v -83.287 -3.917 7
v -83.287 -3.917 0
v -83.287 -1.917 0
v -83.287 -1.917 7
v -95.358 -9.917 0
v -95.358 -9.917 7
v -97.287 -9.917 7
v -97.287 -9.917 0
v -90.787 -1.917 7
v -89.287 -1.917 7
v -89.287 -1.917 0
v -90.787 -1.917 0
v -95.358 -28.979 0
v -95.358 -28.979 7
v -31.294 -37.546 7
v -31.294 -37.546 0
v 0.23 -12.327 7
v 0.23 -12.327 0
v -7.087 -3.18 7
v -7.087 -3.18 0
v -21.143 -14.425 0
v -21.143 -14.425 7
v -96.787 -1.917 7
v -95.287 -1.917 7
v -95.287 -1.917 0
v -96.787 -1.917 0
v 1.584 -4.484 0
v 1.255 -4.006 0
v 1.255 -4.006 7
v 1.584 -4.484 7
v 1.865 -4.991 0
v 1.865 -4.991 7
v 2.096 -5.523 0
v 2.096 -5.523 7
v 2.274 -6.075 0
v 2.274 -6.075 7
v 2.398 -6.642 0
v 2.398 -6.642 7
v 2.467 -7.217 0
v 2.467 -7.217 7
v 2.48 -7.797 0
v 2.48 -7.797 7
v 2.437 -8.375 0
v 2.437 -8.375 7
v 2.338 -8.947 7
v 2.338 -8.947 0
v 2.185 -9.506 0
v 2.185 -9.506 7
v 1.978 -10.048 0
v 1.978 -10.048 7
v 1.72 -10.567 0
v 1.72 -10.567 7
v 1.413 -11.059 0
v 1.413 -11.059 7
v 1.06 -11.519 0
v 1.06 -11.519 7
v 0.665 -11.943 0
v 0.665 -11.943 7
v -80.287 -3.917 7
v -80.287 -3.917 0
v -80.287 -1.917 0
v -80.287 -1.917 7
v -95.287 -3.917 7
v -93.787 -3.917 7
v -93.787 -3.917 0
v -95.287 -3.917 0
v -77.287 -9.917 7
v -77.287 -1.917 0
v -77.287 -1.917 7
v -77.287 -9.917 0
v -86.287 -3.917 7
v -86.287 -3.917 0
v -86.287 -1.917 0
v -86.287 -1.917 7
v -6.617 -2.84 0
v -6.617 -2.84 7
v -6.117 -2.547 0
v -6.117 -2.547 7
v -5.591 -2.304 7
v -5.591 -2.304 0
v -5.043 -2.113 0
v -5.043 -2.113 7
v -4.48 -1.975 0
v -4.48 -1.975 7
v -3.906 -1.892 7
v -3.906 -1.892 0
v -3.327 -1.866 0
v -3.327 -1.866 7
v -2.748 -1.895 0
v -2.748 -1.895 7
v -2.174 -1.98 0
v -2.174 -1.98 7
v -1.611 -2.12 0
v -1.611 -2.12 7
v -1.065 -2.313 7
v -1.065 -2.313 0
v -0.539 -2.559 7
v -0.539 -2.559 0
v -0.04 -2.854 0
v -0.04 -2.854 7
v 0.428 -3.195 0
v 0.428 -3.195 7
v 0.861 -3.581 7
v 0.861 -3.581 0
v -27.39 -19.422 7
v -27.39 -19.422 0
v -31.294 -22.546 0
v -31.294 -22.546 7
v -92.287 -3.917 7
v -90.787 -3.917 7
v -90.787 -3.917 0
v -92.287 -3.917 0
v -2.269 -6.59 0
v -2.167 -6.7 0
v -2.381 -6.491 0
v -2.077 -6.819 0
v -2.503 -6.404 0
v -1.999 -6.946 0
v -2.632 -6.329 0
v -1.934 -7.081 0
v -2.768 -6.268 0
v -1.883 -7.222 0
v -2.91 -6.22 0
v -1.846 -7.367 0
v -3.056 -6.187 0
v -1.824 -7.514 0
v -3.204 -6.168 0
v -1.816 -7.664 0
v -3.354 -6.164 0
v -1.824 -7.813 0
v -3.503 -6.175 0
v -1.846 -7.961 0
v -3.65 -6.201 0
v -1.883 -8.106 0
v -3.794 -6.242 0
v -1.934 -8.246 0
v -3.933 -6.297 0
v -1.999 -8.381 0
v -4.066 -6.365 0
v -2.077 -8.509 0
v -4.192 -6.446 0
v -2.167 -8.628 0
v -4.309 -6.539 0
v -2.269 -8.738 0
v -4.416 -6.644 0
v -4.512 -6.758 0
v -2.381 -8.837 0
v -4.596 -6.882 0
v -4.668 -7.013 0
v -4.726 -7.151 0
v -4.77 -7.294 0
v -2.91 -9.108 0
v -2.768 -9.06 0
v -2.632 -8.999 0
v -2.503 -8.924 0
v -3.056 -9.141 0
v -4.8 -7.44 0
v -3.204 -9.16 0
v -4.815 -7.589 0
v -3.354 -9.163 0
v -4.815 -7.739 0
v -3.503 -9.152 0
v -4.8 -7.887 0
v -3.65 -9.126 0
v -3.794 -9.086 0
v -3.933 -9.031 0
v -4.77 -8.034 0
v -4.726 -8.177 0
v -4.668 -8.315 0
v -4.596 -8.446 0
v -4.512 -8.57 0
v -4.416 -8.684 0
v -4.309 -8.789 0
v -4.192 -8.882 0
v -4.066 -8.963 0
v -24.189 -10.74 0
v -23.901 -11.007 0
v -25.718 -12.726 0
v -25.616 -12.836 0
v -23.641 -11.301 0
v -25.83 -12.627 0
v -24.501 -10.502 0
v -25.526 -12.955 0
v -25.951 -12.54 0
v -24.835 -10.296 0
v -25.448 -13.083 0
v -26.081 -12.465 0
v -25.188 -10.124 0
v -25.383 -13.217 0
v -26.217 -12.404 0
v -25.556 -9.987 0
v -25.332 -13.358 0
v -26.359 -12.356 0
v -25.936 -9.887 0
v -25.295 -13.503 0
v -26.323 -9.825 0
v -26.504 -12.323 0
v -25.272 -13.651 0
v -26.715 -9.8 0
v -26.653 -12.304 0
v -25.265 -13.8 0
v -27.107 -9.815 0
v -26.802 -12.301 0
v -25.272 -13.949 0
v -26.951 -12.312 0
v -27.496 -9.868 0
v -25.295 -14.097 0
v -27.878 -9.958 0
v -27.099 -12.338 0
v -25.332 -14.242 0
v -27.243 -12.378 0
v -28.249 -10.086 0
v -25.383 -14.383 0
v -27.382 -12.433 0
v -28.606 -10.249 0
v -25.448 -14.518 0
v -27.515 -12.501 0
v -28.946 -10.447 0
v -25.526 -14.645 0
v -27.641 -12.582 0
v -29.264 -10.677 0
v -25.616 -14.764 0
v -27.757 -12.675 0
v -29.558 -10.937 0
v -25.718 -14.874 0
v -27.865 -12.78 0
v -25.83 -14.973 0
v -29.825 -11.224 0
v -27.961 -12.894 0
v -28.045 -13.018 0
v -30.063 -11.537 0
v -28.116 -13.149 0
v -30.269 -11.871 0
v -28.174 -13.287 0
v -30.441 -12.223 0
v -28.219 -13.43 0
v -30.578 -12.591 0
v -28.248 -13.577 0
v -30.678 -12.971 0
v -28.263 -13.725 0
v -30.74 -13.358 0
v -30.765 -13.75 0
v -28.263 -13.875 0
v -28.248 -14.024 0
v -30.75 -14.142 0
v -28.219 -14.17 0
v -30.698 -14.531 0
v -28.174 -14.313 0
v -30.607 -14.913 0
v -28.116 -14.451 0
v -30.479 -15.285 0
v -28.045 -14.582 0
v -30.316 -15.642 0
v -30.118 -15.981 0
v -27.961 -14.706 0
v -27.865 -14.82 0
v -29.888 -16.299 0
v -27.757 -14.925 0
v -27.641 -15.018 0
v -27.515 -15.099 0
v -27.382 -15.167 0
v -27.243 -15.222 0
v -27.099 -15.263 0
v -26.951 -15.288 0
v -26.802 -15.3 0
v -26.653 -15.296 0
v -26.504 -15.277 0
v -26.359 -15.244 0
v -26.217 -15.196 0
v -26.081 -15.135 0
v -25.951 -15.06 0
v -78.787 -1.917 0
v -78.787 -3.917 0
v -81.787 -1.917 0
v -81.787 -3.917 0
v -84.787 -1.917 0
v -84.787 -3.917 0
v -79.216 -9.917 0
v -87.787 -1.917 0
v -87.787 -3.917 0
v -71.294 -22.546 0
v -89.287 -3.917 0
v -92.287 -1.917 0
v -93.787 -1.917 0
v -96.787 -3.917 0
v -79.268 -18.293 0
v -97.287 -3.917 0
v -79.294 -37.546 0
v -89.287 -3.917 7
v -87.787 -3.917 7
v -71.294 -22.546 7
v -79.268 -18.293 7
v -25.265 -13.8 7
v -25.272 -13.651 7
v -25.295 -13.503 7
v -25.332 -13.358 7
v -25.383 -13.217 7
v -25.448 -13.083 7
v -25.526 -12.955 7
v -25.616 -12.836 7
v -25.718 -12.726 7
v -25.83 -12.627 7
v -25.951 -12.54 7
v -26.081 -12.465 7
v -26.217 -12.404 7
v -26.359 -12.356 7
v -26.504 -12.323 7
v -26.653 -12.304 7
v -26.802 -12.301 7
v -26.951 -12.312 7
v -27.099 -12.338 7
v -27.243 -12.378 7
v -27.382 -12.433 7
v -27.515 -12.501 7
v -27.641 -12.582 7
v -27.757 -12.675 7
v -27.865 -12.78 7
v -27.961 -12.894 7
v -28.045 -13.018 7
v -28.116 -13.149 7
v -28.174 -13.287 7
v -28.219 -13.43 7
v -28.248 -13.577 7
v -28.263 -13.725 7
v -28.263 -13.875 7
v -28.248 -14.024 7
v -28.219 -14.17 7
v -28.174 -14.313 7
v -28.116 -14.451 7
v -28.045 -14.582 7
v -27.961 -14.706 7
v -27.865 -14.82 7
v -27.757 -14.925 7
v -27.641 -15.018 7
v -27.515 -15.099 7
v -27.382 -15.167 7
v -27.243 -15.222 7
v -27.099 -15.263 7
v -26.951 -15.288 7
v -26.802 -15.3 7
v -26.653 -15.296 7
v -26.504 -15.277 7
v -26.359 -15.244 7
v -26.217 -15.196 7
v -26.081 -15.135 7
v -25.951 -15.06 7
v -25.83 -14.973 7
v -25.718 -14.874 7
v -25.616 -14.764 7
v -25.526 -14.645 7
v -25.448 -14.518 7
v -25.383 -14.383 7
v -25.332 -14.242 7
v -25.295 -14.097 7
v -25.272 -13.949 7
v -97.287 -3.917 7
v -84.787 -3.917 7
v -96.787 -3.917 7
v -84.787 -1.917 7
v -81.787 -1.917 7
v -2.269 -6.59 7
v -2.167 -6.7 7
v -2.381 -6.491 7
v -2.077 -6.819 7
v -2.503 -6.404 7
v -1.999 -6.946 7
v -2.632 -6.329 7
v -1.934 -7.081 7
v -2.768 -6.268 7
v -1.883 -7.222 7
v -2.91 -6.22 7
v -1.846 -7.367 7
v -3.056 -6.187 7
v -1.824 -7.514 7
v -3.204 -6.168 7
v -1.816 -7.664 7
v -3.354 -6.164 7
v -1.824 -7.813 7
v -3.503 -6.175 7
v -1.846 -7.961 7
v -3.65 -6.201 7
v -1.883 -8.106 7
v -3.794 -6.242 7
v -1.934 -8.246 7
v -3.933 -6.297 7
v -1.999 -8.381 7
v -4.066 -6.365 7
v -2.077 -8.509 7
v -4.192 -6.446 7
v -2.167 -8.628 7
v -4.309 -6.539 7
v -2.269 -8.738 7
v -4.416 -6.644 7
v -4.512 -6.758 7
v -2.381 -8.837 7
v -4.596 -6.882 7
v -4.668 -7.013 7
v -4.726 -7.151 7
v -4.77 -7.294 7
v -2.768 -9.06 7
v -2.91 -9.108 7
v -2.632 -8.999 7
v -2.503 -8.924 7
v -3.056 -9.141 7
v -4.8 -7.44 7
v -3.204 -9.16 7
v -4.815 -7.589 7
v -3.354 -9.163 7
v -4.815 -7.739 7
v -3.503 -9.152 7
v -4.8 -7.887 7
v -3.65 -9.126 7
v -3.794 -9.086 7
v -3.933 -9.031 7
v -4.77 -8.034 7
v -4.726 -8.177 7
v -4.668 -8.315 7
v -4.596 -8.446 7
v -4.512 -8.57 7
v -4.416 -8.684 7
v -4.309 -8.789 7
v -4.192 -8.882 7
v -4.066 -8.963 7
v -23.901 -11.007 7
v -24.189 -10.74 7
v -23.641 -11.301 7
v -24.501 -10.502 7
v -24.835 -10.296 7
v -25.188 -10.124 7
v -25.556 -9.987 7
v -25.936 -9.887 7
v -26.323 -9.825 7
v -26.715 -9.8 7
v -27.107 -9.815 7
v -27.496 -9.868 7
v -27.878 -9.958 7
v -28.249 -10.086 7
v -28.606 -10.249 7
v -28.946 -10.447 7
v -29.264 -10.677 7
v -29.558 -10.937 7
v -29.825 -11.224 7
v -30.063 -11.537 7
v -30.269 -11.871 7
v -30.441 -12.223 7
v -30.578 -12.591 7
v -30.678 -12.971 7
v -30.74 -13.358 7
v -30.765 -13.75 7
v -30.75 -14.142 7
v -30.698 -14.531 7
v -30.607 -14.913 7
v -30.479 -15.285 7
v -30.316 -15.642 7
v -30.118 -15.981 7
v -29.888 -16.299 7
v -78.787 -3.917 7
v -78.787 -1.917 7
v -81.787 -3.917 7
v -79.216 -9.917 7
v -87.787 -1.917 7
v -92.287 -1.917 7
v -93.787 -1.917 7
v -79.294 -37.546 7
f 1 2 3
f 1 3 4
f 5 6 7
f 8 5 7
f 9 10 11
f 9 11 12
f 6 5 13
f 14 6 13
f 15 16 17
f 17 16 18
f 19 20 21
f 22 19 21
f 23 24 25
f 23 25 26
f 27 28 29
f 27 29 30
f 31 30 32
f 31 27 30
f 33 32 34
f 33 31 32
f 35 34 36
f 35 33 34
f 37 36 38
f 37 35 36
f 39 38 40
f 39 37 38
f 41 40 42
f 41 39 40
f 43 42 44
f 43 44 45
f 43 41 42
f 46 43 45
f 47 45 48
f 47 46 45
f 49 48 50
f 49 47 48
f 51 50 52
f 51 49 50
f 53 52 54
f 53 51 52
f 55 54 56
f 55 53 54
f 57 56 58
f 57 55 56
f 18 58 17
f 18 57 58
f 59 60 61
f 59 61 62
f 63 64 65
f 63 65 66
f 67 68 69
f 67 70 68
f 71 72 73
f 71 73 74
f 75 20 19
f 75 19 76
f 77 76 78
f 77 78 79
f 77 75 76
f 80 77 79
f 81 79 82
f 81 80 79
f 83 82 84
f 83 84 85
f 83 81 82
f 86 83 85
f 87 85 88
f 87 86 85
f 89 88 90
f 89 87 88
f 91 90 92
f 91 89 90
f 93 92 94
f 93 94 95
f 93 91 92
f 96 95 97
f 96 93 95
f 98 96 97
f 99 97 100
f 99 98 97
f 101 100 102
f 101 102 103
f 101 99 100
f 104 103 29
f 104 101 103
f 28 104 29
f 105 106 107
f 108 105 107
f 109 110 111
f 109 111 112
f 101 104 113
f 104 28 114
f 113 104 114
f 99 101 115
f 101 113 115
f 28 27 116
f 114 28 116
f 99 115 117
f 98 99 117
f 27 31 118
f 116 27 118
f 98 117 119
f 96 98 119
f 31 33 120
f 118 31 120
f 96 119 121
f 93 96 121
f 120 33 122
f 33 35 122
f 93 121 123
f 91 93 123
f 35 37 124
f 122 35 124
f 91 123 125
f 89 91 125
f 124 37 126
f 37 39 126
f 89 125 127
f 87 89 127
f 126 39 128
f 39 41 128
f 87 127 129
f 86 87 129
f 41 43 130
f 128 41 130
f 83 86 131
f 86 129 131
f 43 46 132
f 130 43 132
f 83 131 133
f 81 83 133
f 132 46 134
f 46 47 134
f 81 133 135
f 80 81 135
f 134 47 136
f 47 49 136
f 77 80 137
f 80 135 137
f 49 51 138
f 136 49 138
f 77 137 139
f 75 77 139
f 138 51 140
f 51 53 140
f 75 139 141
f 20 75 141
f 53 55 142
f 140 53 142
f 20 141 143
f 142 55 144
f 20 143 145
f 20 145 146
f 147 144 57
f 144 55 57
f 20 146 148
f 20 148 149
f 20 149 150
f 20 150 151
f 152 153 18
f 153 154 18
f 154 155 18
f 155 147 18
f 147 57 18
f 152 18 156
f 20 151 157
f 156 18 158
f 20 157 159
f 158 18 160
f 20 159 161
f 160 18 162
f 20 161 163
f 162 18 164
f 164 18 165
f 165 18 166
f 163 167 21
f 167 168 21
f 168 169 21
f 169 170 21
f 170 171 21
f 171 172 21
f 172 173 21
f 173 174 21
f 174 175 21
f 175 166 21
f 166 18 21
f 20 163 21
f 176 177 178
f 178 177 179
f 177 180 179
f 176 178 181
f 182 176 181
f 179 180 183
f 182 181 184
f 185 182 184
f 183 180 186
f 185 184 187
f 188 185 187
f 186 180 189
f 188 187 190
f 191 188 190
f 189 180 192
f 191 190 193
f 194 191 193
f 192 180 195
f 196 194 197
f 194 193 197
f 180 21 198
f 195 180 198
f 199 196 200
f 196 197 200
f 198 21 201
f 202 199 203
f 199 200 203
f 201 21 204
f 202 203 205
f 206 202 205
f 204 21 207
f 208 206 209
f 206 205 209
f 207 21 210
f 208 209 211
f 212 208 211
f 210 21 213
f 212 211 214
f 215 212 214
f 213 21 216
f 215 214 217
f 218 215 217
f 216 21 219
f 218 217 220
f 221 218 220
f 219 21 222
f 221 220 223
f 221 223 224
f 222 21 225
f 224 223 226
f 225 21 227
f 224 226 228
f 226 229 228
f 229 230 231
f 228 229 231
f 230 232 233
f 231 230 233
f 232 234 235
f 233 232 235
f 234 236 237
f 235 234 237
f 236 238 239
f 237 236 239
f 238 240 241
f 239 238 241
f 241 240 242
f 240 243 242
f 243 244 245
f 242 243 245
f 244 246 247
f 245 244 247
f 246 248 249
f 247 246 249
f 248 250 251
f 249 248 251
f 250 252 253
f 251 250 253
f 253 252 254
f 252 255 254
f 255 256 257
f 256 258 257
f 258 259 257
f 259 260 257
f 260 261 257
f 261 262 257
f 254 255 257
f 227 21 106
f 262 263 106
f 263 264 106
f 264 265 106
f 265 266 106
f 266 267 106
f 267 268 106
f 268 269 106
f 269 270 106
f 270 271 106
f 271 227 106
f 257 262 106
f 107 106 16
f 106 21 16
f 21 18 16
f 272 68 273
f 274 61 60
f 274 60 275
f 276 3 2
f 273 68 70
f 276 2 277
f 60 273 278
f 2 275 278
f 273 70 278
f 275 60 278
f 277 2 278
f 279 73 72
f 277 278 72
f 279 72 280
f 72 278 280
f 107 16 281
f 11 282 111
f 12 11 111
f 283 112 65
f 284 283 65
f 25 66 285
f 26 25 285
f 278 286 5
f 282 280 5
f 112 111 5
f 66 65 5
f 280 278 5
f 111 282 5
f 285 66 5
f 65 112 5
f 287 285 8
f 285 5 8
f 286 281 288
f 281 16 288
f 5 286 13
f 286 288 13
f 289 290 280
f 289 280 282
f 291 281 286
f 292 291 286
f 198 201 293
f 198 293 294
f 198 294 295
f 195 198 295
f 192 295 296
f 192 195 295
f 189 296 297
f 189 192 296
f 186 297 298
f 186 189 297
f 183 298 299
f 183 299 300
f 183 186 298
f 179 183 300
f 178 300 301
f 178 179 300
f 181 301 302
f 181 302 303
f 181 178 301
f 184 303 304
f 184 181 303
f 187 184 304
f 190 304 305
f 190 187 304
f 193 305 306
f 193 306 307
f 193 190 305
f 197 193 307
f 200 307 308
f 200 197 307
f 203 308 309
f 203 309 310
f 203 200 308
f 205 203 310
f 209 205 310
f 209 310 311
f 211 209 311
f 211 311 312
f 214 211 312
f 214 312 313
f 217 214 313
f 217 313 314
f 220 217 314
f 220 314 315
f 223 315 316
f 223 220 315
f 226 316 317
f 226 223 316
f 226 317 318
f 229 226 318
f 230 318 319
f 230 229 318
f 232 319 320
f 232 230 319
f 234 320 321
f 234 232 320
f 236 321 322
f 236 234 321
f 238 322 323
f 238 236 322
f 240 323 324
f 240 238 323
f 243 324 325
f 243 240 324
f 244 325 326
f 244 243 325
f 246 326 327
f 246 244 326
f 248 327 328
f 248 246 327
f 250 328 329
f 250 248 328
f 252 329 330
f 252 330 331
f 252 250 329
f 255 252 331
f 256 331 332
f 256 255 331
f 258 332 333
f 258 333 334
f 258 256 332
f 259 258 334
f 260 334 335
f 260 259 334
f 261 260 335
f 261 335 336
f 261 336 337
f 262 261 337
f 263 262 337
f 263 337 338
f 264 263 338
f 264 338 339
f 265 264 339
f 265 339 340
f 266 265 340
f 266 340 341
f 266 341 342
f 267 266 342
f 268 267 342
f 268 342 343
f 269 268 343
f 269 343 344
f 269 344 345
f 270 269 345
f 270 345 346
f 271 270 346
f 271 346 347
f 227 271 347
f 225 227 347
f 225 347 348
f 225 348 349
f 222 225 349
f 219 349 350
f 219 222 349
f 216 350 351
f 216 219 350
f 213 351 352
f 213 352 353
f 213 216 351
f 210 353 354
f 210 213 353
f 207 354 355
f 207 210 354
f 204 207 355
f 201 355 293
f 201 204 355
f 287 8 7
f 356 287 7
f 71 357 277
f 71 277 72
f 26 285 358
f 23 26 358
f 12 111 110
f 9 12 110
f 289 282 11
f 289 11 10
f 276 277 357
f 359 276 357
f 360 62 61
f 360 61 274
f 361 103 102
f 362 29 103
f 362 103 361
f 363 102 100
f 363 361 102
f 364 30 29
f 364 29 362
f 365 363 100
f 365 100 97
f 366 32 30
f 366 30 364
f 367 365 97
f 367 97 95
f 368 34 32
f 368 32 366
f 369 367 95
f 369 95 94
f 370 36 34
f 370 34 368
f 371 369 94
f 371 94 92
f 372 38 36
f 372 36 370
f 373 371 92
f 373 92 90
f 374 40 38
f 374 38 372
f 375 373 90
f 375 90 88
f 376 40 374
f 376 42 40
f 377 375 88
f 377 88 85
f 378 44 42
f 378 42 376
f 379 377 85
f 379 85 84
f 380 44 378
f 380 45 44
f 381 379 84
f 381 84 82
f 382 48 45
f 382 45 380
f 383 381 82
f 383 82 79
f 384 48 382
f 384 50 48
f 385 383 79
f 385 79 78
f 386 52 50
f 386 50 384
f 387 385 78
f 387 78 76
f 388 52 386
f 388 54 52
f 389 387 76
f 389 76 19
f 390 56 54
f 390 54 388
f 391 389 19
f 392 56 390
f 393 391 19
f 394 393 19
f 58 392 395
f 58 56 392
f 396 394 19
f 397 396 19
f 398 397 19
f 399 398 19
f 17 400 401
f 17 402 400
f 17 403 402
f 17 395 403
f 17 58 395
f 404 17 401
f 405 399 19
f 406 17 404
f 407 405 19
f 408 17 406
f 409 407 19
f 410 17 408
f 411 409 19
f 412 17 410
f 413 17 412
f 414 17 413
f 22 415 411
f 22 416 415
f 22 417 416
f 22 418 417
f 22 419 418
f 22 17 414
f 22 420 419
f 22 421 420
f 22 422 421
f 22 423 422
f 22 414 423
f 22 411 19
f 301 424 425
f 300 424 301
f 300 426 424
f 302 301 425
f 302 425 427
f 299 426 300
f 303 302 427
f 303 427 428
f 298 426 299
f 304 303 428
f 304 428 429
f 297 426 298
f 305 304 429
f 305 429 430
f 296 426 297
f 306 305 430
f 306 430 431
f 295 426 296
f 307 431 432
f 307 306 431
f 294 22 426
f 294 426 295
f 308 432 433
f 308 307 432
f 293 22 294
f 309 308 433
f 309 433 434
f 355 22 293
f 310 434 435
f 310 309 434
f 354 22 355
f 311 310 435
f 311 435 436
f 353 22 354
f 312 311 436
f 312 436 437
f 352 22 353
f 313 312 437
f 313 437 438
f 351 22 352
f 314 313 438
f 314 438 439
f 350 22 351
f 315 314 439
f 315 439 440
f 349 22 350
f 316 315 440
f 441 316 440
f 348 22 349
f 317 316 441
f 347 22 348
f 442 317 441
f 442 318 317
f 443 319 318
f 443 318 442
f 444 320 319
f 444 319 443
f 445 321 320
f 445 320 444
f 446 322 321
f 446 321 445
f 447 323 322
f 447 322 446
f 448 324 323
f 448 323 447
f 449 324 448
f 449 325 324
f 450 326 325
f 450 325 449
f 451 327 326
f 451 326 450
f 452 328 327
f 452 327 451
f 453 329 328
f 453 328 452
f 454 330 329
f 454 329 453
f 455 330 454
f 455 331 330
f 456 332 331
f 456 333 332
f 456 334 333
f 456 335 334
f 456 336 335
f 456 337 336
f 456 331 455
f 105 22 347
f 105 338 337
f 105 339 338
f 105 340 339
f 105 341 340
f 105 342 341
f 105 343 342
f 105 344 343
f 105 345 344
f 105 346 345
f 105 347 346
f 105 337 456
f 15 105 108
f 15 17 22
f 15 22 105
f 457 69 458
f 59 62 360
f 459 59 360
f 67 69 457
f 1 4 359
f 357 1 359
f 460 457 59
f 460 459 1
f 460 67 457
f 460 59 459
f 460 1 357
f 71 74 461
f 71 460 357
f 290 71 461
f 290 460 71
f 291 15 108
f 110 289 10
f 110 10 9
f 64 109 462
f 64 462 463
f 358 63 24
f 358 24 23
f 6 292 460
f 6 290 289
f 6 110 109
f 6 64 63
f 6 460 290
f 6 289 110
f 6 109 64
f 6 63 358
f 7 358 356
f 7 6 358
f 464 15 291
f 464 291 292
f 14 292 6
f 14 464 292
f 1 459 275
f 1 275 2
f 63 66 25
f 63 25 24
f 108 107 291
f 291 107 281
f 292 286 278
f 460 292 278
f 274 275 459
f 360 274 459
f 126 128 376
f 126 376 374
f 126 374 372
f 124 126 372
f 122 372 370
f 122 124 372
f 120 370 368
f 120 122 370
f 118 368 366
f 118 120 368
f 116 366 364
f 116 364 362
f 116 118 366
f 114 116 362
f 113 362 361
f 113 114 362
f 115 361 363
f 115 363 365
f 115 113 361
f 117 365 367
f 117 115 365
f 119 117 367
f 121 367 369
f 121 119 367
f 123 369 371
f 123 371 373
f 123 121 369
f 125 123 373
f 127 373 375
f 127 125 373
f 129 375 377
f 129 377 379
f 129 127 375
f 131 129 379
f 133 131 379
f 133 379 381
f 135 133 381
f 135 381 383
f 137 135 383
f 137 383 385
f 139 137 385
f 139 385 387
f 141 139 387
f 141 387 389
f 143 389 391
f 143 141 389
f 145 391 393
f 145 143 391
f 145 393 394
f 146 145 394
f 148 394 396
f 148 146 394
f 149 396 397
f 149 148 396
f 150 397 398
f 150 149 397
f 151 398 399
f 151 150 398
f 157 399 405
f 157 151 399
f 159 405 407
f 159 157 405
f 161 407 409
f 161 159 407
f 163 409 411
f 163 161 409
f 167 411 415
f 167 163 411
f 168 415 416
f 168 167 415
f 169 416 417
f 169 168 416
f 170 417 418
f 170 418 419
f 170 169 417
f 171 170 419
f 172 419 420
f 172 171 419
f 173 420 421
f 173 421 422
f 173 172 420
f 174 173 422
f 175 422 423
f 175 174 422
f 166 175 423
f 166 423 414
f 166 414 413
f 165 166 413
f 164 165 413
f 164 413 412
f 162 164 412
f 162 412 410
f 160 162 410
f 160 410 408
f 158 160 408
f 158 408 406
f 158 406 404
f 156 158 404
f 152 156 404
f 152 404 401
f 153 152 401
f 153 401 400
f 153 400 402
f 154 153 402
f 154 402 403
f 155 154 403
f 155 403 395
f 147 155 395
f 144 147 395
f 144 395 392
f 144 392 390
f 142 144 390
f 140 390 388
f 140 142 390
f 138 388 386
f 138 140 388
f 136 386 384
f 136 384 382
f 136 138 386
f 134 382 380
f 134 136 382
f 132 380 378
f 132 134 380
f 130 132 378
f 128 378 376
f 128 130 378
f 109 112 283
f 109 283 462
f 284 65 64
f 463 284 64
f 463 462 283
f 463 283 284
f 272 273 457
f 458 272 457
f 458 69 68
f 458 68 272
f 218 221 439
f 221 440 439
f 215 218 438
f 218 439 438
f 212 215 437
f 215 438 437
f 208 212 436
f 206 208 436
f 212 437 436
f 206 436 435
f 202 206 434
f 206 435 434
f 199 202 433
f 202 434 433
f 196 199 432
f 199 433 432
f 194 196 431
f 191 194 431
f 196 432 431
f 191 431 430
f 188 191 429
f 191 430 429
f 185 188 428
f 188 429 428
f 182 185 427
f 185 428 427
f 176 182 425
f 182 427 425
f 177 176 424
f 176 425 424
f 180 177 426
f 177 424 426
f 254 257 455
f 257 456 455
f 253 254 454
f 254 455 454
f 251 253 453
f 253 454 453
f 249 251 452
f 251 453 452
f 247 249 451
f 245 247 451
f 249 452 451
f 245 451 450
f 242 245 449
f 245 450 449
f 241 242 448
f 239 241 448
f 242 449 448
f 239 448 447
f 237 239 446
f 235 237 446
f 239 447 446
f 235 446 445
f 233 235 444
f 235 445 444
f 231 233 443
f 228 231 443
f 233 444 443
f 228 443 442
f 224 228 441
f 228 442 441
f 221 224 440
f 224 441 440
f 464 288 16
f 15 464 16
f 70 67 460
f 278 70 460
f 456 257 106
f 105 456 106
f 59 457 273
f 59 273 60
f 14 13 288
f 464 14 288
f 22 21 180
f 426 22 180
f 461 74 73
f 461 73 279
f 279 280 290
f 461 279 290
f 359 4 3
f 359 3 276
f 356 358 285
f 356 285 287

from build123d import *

# Parameters (mm, degrees)
F0_R        = 1.5
F1_DEPTH    = 7
F2_R        = 3.99999
F3_T1_DEPTH = 37
F4_W        = 20
F4_H        = 7
F5_DEPTH    = 6
F6_W        = 1.5
F6_H        = 7
F7_DEPTH    = 2


# Not quite as in the source:
# - a fillet or chamfer that OpenCascade refuses, or shapes differently, is made with other operations: its cross-section is extruded or revolved along the edge and cut away or added
# - a fillet or chamfer is up to 0.001 mm smaller than in the source, because OpenCascade refuses the exact size


with BuildPart() as f1:
    # F0 (on Top) → F1 (new body)
    with BuildSketch(Plane.XY):
        Polygon((-79.2163482308, -9.9173756316), (-95.3576945582, -9.9173756316), (-95.3576945582, -28.9785558952), (-79.2939967774, -37.5458613783), (-31.2939967774, -37.5458613783), (4.9152223427, -8.5784860822), (-2.401850828, 0.5678553812), (-21.1427022546, -14.4248257601), (-26.1402626351, -8.1778752846), (-32.3872131106, -13.175435665), (-27.3896527302, -19.4223861405), (-31.2939967774, -22.5458613783), (-71.2939967774, -22.5458613783), (-79.2678481488, -18.2931406469), align=None)
        with Locations((-26.7649576826, -13.8001307126)):
            Circle(F0_R, mode=Mode.SUBTRACT)
        with Locations((-3.3164724251, -7.6638418965)):
            Circle(F0_R, mode=Mode.SUBTRACT)
    extrude(amount=F1_DEPTH)

    # F2 (radius 4 in the source; OpenCascade refuses exactly that, so slightly less here)
    f2_edges = [f1.edges().sort_by_distance(p)[0] for p in [
        (-26.140263, -8.177875, 3.5),
        (-32.387213, -13.175436, 3.5),
    ]]
    fillet(f2_edges, radius=F2_R)

    # F3: fillet of radius 6 on 2 edges, made by hand

    # F3_s2 → F3_t1 (cut)
    with BuildSketch(Plane.XY.offset(-15)):
        with BuildLine():
            ThreePointArc((-7.0870636847, -3.1803149041), (-2.6763042429, -1.9022253527), (1.3463194573, -4.1173574755))
            Line((1.3463194573, -4.1173574755), (-2.401850828, 0.5678553812))
            Line((-2.401850828, 0.5678553812), (-7.0870636847, -3.1803149041))
        make_face()
        with BuildLine():
            ThreePointArc((1.1670520574, -3.8932732256), (2.4451416088, -8.3040326673), (0.2300094861, -12.3266563675))
            Line((0.2300094861, -12.3266563675), (4.9152223427, -8.5784860822))
            Line((4.9152223427, -8.5784860822), (1.1670520574, -3.8932732256))
        make_face()
    extrude(amount=F3_T1_DEPTH, mode=Mode.SUBTRACT)

    # F4 (on face) → F5 (join)
    with BuildSketch(Plane(origin=(0, -9.9173756316, 0), x_dir=(-1, 0, 0), z_dir=(0, 1, 0))):
        with Locations((87.2870213945, 3.5)):
            Rectangle(F4_W, F4_H)
    extrude(amount=F5_DEPTH)

    # F6 (on face) → F7 (join)
    with BuildSketch(Plane(origin=(0, -3.9173756316, 0), x_dir=(-1, 0, 0), z_dir=(0, 1, 0))):
        with Locations((78.0370213945, 3.5)):
            Rectangle(F6_W, F6_H)
        with Locations((81.0370213945, 3.5)):
            Rectangle(F6_W, F6_H)
        with Locations((84.0370213945, 3.5)):
            Rectangle(F6_W, F6_H)
        with Locations((87.0370213945, 3.5)):
            Rectangle(F6_W, F6_H)
        with Locations((90.0370213945, 3.5)):
            Rectangle(F6_W, F6_H)
        with Locations((93.0370213945, 3.5)):
            Rectangle(F6_W, F6_H)
        with Locations((96.0370213945, 3.5)):
            Rectangle(F6_W, F6_H)
    extrude(amount=F7_DEPTH)


solid = f1.part
